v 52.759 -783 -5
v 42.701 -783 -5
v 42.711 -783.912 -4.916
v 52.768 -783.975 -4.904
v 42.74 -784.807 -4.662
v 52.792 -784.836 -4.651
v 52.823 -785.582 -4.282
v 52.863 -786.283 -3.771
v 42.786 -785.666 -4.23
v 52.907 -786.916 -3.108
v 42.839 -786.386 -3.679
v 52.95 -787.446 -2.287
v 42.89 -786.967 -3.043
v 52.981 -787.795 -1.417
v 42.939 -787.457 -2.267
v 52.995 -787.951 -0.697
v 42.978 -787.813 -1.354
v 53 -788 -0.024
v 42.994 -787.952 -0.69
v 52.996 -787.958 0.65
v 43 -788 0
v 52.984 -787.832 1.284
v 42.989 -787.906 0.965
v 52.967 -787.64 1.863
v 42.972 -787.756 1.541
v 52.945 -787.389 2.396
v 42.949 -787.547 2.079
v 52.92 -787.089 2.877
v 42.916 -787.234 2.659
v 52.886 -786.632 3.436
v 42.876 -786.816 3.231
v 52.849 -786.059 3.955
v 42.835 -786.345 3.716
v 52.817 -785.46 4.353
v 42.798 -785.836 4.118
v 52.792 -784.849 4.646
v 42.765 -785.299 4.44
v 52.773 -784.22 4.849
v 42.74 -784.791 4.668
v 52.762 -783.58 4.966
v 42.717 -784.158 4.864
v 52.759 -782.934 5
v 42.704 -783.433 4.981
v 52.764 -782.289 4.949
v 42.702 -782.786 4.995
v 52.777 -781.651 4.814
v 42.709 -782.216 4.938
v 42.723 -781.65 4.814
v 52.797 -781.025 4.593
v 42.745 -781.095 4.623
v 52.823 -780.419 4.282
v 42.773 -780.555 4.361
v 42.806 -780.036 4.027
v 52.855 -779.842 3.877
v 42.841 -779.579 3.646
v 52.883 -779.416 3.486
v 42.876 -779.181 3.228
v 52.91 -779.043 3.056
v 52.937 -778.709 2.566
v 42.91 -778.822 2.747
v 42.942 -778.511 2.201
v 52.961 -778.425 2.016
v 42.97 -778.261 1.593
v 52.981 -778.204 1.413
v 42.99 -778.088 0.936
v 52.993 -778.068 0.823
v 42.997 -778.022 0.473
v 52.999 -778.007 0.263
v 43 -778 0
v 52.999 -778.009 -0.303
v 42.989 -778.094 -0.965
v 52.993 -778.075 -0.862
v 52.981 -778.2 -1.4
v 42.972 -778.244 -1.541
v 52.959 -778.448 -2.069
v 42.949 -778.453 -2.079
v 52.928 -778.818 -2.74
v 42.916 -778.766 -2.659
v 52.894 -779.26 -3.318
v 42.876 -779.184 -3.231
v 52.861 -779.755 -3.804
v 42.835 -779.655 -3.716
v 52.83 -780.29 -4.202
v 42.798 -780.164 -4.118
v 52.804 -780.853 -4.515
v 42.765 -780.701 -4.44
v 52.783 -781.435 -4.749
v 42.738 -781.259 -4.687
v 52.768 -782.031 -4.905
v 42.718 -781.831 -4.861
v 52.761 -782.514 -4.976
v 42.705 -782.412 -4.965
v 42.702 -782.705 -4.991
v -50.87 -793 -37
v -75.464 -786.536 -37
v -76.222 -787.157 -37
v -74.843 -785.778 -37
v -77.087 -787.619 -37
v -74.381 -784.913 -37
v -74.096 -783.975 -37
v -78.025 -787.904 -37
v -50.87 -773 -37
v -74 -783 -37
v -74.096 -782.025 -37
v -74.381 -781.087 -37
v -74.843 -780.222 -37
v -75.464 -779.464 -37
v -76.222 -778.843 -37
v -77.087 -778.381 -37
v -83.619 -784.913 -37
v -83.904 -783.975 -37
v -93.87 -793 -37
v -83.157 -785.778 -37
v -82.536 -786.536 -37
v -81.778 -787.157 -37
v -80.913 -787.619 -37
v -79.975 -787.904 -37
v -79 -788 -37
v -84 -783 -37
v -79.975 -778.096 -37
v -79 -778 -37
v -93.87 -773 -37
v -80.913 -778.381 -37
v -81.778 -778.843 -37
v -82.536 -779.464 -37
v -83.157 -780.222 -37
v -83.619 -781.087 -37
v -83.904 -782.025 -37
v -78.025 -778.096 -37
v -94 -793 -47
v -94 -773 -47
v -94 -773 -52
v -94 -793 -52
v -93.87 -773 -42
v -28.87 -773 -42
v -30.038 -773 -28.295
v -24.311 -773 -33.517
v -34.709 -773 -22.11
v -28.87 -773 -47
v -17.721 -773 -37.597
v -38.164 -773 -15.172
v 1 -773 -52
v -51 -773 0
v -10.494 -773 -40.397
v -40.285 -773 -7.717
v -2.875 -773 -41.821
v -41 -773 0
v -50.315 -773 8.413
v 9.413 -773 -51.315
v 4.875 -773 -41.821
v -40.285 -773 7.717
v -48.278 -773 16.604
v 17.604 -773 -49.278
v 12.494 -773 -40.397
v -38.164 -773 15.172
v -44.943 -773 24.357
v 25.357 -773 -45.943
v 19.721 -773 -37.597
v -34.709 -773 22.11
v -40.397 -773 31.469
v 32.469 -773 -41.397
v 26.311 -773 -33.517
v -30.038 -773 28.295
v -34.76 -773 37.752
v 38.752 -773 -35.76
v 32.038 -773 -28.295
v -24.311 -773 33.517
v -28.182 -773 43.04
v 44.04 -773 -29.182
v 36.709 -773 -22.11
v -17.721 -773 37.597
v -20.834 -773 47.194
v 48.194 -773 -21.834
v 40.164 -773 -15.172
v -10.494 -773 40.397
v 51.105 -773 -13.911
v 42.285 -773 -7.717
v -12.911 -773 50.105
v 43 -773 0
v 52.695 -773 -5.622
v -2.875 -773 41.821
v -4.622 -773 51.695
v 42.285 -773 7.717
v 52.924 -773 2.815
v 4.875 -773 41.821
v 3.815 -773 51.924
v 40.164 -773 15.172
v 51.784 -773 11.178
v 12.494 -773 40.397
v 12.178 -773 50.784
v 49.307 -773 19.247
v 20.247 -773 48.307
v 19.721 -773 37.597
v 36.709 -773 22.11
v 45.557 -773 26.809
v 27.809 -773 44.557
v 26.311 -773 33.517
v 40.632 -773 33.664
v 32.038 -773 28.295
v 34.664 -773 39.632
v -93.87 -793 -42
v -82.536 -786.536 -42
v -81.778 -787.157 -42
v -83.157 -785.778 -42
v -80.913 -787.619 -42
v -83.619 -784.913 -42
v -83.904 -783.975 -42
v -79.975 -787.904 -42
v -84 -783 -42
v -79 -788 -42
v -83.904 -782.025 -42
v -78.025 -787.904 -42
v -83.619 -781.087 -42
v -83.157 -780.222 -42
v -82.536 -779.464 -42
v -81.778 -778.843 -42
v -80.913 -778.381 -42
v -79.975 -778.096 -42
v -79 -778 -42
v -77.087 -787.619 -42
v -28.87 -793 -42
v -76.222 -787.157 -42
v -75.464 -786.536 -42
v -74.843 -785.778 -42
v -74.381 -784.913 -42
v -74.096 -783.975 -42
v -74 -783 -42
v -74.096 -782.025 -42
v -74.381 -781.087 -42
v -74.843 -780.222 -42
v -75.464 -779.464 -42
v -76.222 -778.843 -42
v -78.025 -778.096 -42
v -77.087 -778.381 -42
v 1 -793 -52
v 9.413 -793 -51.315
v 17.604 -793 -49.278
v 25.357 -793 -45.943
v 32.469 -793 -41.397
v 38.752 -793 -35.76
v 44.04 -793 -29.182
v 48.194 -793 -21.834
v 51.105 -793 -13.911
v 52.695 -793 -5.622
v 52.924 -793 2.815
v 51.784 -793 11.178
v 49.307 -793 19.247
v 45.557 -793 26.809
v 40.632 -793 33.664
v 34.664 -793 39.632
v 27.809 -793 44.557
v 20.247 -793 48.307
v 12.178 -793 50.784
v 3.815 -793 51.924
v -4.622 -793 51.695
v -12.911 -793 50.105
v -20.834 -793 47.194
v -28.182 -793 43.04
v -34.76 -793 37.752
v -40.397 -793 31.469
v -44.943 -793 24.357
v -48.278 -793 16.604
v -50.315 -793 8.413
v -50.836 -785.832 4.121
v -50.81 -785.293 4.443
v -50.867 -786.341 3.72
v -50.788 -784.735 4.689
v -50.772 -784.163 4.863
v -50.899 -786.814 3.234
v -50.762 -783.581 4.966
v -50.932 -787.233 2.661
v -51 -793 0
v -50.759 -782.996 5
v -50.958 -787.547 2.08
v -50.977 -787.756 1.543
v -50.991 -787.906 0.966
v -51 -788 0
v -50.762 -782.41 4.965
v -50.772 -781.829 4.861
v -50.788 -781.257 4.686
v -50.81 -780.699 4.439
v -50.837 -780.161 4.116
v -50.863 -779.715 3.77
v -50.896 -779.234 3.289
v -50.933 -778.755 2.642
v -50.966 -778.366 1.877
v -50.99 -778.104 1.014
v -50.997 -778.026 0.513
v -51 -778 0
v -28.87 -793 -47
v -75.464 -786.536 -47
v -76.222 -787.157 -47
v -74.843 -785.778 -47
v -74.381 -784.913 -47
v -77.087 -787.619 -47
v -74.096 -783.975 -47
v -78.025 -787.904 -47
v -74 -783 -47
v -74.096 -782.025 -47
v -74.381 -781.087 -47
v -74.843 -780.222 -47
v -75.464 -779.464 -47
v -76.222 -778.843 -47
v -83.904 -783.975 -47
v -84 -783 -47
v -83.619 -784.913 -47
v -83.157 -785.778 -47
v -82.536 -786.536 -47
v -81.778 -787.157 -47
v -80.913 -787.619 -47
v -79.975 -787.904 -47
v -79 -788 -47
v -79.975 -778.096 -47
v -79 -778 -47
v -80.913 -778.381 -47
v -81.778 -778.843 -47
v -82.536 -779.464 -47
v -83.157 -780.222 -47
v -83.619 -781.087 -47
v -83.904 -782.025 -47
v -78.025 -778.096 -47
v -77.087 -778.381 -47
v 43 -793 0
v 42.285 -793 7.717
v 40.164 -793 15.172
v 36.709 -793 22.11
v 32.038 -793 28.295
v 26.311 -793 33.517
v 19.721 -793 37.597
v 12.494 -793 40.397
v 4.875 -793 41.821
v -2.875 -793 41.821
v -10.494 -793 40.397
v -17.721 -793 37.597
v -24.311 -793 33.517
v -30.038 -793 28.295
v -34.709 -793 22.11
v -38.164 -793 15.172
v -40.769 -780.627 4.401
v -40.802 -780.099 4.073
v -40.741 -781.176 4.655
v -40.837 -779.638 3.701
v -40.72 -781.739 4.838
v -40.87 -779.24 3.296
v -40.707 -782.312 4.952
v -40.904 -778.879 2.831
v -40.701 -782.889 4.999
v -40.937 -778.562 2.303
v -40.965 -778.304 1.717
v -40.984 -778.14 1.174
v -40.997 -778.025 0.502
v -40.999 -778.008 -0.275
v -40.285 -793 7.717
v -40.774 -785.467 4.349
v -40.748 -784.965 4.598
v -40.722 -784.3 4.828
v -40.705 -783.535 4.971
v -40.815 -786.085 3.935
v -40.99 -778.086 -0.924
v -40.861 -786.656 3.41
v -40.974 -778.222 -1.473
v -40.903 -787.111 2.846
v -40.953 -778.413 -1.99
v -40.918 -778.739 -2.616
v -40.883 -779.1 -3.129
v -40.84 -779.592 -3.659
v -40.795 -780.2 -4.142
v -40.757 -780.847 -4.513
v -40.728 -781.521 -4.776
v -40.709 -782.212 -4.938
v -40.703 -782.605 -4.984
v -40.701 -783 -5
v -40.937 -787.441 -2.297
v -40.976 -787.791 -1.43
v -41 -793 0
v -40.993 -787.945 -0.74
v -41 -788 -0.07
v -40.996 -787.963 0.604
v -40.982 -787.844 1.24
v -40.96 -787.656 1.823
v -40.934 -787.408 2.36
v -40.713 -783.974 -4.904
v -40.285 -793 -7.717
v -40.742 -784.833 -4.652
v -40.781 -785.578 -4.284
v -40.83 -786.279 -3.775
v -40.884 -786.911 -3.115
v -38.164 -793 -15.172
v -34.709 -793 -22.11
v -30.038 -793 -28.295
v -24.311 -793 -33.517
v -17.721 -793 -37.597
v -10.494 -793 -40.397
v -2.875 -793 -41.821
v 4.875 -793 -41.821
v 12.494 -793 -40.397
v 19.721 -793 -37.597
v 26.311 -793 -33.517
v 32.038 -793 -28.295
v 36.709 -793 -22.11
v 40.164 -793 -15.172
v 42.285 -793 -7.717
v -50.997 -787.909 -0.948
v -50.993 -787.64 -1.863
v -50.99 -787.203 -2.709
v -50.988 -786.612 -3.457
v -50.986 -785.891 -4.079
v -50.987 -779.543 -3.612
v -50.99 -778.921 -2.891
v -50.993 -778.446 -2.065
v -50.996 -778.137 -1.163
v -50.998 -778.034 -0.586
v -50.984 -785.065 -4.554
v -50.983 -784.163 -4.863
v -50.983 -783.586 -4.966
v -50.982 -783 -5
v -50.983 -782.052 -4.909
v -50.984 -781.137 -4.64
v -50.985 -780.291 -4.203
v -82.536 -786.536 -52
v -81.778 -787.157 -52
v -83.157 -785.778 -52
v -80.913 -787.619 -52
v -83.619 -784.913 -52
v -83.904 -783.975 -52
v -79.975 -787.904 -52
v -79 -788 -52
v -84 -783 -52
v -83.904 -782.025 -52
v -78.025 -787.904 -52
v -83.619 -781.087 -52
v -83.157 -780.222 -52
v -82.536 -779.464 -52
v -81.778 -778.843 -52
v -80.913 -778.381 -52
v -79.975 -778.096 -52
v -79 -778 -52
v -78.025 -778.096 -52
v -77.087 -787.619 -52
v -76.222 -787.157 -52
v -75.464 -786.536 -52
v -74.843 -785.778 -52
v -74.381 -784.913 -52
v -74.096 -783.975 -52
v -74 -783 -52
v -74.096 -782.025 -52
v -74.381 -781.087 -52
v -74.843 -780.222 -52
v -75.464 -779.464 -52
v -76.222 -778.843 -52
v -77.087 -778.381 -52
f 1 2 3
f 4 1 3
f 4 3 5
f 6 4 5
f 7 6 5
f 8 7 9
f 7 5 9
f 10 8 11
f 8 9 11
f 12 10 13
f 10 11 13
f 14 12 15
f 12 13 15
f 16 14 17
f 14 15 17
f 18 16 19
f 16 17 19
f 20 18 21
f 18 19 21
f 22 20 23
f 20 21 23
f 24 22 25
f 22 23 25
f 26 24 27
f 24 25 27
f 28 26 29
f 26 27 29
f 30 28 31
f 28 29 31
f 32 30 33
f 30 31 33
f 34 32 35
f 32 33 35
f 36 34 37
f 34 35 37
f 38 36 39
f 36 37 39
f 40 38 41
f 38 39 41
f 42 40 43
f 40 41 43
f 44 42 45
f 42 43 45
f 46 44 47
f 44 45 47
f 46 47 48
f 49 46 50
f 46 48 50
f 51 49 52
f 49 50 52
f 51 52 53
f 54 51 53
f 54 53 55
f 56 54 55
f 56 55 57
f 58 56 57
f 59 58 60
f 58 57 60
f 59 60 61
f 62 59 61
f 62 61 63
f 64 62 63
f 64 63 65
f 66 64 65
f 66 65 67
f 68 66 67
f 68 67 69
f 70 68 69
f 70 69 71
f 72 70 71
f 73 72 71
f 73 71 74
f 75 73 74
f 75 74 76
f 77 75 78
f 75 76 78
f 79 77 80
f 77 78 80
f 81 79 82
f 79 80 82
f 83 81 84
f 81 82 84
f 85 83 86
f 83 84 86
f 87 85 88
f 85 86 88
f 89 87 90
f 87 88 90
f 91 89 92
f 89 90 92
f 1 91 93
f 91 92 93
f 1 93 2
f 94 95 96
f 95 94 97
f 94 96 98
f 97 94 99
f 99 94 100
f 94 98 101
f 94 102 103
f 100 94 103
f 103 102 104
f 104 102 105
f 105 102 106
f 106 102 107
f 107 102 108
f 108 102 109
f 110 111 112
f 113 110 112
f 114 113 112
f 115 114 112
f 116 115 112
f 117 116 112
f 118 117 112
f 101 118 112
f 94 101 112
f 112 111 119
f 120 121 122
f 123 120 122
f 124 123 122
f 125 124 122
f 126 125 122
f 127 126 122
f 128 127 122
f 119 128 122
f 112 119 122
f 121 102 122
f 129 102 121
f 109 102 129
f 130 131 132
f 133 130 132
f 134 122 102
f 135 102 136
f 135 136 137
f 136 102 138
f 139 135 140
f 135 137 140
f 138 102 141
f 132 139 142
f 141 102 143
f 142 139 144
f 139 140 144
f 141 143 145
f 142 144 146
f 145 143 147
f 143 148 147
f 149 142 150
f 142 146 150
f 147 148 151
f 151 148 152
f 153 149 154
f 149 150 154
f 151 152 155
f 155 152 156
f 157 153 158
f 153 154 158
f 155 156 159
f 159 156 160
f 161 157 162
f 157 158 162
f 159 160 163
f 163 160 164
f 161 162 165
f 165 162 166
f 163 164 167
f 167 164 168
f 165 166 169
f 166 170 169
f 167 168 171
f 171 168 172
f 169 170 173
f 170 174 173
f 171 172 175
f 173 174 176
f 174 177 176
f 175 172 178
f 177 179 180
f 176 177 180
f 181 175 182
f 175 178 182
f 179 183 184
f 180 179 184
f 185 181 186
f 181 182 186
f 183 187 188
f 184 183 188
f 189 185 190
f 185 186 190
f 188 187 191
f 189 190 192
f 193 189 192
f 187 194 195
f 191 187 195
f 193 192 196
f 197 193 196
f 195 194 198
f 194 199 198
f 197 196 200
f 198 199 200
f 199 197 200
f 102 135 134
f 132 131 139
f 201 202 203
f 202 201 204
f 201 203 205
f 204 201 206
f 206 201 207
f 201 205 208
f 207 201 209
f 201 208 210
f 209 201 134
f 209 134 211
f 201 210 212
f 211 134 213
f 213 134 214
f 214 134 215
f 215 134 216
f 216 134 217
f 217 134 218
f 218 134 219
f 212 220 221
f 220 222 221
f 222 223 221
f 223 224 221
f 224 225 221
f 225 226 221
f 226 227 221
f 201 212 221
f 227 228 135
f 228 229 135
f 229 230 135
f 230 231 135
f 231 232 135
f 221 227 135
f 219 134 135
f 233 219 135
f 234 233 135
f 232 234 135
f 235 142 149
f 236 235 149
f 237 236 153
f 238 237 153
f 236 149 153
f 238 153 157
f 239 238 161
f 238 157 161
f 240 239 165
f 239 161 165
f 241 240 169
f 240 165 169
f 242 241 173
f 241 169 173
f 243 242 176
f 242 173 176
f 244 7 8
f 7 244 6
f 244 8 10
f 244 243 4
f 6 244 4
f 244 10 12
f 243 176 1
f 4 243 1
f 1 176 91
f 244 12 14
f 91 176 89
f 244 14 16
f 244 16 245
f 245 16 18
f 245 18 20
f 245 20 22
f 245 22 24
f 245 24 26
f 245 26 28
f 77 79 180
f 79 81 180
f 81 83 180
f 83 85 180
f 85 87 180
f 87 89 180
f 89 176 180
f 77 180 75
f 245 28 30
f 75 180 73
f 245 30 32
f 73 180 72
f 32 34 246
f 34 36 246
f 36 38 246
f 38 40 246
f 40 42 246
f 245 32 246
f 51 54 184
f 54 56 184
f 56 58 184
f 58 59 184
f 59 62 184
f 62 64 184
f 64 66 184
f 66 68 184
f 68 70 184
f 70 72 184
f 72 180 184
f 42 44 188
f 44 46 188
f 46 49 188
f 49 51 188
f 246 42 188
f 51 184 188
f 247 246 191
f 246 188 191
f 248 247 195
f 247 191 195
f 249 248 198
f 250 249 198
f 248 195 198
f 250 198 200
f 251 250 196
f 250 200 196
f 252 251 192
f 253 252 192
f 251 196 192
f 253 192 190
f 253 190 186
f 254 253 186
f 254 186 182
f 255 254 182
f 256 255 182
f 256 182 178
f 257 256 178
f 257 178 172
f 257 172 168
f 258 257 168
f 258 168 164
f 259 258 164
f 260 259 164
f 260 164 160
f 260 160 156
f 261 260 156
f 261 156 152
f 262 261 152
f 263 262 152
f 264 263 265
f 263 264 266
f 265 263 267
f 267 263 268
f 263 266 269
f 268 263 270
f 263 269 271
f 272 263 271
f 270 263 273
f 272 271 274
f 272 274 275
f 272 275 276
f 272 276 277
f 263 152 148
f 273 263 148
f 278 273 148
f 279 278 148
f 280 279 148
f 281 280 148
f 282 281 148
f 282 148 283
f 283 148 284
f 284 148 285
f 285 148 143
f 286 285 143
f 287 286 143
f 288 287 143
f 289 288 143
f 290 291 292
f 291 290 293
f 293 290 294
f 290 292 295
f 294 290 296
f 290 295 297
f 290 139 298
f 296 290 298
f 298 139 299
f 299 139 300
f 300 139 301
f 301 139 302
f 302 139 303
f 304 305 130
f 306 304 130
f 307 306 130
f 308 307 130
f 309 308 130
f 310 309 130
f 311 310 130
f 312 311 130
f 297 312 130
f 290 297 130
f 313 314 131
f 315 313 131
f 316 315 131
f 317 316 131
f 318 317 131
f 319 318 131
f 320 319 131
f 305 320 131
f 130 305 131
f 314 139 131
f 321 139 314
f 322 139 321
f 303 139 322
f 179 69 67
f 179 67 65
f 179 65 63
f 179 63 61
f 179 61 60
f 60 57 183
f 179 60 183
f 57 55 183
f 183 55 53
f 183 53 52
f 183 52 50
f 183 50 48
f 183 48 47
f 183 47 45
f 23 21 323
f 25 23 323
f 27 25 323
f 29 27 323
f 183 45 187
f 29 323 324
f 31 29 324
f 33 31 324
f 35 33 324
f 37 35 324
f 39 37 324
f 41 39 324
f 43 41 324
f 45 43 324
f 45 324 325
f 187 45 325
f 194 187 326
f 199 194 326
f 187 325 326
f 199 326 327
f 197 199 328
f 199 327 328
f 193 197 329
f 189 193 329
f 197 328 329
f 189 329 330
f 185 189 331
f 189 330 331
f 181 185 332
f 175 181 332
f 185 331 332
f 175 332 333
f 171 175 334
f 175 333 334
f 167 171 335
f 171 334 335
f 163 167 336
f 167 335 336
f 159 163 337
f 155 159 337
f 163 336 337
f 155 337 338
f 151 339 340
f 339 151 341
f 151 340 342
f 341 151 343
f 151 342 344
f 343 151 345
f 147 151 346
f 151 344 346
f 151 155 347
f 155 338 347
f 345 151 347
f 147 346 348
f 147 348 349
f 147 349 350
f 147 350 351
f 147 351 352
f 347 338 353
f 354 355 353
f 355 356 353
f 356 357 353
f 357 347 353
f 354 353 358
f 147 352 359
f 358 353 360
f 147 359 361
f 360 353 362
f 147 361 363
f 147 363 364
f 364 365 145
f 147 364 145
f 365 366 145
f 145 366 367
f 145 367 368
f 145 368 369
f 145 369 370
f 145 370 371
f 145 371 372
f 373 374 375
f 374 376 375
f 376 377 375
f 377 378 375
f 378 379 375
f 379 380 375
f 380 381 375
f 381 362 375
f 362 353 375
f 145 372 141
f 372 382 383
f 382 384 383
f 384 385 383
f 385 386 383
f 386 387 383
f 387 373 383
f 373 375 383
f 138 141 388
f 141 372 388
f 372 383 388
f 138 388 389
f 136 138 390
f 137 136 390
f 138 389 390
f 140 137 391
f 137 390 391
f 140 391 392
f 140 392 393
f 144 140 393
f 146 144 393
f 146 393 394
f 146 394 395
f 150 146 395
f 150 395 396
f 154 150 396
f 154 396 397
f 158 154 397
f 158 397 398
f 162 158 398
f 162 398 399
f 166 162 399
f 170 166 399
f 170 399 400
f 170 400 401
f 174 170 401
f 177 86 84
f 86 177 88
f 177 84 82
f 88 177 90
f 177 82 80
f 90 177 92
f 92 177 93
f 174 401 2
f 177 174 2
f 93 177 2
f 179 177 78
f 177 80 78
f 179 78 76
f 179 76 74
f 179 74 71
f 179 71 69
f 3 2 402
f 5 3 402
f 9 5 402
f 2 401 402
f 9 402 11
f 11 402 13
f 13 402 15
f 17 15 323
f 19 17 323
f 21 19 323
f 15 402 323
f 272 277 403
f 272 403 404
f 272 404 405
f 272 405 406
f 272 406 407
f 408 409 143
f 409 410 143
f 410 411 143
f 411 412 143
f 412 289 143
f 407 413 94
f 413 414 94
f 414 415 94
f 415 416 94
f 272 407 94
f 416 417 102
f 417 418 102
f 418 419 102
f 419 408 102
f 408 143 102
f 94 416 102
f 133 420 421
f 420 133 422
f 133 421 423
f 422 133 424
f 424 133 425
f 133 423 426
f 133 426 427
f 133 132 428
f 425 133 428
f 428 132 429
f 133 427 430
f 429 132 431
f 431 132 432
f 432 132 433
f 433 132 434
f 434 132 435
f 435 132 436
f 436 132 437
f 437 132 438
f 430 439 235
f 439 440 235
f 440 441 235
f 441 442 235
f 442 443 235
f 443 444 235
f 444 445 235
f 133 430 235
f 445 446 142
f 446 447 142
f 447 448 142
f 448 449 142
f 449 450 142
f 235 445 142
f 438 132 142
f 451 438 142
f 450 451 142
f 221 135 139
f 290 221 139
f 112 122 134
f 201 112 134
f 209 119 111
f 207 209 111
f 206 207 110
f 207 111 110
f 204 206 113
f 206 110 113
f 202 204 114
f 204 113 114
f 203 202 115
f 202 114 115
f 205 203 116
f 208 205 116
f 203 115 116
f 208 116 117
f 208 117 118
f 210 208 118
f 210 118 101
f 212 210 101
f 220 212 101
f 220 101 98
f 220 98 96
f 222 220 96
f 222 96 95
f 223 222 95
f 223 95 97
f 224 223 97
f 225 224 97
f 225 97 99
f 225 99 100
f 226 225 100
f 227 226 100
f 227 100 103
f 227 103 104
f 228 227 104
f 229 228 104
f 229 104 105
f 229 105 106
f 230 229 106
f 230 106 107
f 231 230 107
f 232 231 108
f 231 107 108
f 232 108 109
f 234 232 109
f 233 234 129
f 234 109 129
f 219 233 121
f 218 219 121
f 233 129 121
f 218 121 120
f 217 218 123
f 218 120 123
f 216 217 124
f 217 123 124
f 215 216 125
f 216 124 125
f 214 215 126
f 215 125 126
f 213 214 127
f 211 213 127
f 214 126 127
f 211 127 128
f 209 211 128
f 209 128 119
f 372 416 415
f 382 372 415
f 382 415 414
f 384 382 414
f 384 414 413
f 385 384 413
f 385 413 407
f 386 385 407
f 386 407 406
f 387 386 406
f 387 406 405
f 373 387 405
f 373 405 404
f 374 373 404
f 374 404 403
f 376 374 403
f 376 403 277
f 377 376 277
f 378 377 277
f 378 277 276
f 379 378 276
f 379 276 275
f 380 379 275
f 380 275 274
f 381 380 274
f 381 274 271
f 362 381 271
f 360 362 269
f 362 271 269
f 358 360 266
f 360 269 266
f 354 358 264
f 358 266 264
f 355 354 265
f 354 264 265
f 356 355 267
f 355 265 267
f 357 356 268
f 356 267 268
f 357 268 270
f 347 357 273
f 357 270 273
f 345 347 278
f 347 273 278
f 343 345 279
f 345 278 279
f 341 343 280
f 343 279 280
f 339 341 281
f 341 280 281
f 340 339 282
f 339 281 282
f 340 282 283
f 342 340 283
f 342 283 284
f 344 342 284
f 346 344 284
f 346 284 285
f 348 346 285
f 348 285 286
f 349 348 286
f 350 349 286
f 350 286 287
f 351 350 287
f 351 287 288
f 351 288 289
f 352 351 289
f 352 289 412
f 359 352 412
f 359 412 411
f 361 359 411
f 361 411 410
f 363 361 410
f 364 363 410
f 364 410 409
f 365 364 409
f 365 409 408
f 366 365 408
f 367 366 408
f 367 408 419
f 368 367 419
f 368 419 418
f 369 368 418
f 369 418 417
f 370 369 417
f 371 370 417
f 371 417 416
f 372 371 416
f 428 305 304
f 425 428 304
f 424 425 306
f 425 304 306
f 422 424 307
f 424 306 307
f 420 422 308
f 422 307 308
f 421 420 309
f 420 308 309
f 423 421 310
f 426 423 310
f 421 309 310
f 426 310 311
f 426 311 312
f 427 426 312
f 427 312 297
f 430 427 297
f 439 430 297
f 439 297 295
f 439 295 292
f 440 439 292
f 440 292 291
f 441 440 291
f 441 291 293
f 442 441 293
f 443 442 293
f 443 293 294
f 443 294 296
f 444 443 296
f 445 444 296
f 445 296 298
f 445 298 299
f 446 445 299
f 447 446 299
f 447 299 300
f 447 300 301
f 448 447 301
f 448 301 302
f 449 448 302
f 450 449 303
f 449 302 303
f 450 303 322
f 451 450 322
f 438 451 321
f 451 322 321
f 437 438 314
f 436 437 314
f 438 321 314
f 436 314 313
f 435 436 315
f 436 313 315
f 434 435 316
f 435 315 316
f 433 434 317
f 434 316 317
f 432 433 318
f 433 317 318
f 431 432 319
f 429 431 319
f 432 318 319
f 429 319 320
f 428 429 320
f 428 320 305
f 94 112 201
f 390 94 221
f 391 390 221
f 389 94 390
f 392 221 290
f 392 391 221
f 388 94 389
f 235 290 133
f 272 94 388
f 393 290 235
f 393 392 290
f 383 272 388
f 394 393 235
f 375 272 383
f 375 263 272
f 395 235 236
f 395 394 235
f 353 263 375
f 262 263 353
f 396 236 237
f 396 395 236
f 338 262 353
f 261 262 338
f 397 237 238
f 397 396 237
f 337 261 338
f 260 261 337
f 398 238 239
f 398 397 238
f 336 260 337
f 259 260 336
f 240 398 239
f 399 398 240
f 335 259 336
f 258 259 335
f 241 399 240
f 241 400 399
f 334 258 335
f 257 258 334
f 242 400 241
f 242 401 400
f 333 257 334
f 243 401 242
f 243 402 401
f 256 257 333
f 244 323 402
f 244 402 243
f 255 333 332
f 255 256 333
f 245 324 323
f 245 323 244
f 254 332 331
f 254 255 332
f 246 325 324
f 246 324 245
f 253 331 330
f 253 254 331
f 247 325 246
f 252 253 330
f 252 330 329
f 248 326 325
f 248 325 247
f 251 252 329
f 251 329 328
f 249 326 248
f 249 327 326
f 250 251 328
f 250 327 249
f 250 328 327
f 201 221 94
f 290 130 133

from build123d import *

# Parameters (mm, degrees)
PAD_DEPTH            = 20
SKETCH002_R          = 5
POCKET001_DEPTH      = 104.001
HOLE001_D            = 6.6
HOLE001_DEPTH        = 25
HOLE001_CSINK_D      = 12
HOLE001_CSINK_ANGLE  = 90
HOLE001_TIPS_R       = 3.3
SKETCH001_R          = 42
POCKET_DEPTH         = 20.001
SKETCH020_R          = 5
POCKET005_DEPTH      = 15.001
BODY_PLACEMENT_ANGLE = 90


with BuildPart() as part:
    # Sketch → Pad (new body)
    with BuildSketch(Plane.XY):
        with BuildLine():
            Line((-51.87, -37), (-94.87, -37))
            Line((-94.87, -37), (-94.87, -42))
            Line((-94.87, -42), (-29.87, -42))
            Line((-29.87, -42), (-29.87, -47))
            Line((-29.87, -47), (-95, -47))
            Line((-95, -47), (-95, -52))
            Line((-95, -52), (-30, -52))
            Line((-30, -52), (0, -52))
            ThreePointArc((0, -52), (36.769553, 36.769553), (-52, 0))
            Line((-52, 0), (-51.87, -37))
        make_face()
    extrude(amount=PAD_DEPTH)

    # Sketch002 (on DatumPlane) → Pocket001 (cut, through all)
    with BuildSketch(Plane(origin=(-52, 0, 0), x_dir=(0, -1, 0), z_dir=(-1, 0, 0))):
        with Locations((0, 10)):
            Circle(SKETCH002_R)
    extrude(amount=-POCKET001_DEPTH, mode=Mode.SUBTRACT)

    # Hole001
    with Locations(Plane.XZ.offset(42)):
        with Locations((65, 10)):
            CounterSinkHole(HOLE001_D / 2, HOLE001_CSINK_D / 2, depth=HOLE001_DEPTH, counter_sink_angle=HOLE001_CSINK_ANGLE)

    # Hole001 tips → Hole001 tip 1 section 0
    with BuildSketch(Plane.XZ.offset(17), mode=Mode.PRIVATE) as hole001_tip_1_s0:
        with Locations((65, 10)):
            Circle(HOLE001_TIPS_R)
    loft([hole001_tip_1_s0.sketch, Vertex(65, -15.01716, 10)], mode=Mode.SUBTRACT)

    # Sketch001 → Pocket (cut, through all)
    with BuildSketch(Plane.XY.offset(20)):
        Circle(SKETCH001_R)
    extrude(amount=-POCKET_DEPTH, mode=Mode.SUBTRACT)

    # Sketch020 (on DatumPlane) → Pocket005 (cut, through all)
    with BuildSketch(Plane(origin=(0, -37, 0), x_dir=(-1, 0, 0), z_dir=(0, 1, 0))):
        with Locations((80, 10)):
            Circle(SKETCH020_R)
    extrude(amount=-POCKET005_DEPTH, mode=Mode.SUBTRACT)


with BuildPart() as part_1:
    # Body placement: moved
    add(part.part.moved(Location((1, -773, 0))).rotate(Axis((1, -773, 0), (1, 0, 0)), BODY_PLACEMENT_ANGLE))


solid = part_1.part
